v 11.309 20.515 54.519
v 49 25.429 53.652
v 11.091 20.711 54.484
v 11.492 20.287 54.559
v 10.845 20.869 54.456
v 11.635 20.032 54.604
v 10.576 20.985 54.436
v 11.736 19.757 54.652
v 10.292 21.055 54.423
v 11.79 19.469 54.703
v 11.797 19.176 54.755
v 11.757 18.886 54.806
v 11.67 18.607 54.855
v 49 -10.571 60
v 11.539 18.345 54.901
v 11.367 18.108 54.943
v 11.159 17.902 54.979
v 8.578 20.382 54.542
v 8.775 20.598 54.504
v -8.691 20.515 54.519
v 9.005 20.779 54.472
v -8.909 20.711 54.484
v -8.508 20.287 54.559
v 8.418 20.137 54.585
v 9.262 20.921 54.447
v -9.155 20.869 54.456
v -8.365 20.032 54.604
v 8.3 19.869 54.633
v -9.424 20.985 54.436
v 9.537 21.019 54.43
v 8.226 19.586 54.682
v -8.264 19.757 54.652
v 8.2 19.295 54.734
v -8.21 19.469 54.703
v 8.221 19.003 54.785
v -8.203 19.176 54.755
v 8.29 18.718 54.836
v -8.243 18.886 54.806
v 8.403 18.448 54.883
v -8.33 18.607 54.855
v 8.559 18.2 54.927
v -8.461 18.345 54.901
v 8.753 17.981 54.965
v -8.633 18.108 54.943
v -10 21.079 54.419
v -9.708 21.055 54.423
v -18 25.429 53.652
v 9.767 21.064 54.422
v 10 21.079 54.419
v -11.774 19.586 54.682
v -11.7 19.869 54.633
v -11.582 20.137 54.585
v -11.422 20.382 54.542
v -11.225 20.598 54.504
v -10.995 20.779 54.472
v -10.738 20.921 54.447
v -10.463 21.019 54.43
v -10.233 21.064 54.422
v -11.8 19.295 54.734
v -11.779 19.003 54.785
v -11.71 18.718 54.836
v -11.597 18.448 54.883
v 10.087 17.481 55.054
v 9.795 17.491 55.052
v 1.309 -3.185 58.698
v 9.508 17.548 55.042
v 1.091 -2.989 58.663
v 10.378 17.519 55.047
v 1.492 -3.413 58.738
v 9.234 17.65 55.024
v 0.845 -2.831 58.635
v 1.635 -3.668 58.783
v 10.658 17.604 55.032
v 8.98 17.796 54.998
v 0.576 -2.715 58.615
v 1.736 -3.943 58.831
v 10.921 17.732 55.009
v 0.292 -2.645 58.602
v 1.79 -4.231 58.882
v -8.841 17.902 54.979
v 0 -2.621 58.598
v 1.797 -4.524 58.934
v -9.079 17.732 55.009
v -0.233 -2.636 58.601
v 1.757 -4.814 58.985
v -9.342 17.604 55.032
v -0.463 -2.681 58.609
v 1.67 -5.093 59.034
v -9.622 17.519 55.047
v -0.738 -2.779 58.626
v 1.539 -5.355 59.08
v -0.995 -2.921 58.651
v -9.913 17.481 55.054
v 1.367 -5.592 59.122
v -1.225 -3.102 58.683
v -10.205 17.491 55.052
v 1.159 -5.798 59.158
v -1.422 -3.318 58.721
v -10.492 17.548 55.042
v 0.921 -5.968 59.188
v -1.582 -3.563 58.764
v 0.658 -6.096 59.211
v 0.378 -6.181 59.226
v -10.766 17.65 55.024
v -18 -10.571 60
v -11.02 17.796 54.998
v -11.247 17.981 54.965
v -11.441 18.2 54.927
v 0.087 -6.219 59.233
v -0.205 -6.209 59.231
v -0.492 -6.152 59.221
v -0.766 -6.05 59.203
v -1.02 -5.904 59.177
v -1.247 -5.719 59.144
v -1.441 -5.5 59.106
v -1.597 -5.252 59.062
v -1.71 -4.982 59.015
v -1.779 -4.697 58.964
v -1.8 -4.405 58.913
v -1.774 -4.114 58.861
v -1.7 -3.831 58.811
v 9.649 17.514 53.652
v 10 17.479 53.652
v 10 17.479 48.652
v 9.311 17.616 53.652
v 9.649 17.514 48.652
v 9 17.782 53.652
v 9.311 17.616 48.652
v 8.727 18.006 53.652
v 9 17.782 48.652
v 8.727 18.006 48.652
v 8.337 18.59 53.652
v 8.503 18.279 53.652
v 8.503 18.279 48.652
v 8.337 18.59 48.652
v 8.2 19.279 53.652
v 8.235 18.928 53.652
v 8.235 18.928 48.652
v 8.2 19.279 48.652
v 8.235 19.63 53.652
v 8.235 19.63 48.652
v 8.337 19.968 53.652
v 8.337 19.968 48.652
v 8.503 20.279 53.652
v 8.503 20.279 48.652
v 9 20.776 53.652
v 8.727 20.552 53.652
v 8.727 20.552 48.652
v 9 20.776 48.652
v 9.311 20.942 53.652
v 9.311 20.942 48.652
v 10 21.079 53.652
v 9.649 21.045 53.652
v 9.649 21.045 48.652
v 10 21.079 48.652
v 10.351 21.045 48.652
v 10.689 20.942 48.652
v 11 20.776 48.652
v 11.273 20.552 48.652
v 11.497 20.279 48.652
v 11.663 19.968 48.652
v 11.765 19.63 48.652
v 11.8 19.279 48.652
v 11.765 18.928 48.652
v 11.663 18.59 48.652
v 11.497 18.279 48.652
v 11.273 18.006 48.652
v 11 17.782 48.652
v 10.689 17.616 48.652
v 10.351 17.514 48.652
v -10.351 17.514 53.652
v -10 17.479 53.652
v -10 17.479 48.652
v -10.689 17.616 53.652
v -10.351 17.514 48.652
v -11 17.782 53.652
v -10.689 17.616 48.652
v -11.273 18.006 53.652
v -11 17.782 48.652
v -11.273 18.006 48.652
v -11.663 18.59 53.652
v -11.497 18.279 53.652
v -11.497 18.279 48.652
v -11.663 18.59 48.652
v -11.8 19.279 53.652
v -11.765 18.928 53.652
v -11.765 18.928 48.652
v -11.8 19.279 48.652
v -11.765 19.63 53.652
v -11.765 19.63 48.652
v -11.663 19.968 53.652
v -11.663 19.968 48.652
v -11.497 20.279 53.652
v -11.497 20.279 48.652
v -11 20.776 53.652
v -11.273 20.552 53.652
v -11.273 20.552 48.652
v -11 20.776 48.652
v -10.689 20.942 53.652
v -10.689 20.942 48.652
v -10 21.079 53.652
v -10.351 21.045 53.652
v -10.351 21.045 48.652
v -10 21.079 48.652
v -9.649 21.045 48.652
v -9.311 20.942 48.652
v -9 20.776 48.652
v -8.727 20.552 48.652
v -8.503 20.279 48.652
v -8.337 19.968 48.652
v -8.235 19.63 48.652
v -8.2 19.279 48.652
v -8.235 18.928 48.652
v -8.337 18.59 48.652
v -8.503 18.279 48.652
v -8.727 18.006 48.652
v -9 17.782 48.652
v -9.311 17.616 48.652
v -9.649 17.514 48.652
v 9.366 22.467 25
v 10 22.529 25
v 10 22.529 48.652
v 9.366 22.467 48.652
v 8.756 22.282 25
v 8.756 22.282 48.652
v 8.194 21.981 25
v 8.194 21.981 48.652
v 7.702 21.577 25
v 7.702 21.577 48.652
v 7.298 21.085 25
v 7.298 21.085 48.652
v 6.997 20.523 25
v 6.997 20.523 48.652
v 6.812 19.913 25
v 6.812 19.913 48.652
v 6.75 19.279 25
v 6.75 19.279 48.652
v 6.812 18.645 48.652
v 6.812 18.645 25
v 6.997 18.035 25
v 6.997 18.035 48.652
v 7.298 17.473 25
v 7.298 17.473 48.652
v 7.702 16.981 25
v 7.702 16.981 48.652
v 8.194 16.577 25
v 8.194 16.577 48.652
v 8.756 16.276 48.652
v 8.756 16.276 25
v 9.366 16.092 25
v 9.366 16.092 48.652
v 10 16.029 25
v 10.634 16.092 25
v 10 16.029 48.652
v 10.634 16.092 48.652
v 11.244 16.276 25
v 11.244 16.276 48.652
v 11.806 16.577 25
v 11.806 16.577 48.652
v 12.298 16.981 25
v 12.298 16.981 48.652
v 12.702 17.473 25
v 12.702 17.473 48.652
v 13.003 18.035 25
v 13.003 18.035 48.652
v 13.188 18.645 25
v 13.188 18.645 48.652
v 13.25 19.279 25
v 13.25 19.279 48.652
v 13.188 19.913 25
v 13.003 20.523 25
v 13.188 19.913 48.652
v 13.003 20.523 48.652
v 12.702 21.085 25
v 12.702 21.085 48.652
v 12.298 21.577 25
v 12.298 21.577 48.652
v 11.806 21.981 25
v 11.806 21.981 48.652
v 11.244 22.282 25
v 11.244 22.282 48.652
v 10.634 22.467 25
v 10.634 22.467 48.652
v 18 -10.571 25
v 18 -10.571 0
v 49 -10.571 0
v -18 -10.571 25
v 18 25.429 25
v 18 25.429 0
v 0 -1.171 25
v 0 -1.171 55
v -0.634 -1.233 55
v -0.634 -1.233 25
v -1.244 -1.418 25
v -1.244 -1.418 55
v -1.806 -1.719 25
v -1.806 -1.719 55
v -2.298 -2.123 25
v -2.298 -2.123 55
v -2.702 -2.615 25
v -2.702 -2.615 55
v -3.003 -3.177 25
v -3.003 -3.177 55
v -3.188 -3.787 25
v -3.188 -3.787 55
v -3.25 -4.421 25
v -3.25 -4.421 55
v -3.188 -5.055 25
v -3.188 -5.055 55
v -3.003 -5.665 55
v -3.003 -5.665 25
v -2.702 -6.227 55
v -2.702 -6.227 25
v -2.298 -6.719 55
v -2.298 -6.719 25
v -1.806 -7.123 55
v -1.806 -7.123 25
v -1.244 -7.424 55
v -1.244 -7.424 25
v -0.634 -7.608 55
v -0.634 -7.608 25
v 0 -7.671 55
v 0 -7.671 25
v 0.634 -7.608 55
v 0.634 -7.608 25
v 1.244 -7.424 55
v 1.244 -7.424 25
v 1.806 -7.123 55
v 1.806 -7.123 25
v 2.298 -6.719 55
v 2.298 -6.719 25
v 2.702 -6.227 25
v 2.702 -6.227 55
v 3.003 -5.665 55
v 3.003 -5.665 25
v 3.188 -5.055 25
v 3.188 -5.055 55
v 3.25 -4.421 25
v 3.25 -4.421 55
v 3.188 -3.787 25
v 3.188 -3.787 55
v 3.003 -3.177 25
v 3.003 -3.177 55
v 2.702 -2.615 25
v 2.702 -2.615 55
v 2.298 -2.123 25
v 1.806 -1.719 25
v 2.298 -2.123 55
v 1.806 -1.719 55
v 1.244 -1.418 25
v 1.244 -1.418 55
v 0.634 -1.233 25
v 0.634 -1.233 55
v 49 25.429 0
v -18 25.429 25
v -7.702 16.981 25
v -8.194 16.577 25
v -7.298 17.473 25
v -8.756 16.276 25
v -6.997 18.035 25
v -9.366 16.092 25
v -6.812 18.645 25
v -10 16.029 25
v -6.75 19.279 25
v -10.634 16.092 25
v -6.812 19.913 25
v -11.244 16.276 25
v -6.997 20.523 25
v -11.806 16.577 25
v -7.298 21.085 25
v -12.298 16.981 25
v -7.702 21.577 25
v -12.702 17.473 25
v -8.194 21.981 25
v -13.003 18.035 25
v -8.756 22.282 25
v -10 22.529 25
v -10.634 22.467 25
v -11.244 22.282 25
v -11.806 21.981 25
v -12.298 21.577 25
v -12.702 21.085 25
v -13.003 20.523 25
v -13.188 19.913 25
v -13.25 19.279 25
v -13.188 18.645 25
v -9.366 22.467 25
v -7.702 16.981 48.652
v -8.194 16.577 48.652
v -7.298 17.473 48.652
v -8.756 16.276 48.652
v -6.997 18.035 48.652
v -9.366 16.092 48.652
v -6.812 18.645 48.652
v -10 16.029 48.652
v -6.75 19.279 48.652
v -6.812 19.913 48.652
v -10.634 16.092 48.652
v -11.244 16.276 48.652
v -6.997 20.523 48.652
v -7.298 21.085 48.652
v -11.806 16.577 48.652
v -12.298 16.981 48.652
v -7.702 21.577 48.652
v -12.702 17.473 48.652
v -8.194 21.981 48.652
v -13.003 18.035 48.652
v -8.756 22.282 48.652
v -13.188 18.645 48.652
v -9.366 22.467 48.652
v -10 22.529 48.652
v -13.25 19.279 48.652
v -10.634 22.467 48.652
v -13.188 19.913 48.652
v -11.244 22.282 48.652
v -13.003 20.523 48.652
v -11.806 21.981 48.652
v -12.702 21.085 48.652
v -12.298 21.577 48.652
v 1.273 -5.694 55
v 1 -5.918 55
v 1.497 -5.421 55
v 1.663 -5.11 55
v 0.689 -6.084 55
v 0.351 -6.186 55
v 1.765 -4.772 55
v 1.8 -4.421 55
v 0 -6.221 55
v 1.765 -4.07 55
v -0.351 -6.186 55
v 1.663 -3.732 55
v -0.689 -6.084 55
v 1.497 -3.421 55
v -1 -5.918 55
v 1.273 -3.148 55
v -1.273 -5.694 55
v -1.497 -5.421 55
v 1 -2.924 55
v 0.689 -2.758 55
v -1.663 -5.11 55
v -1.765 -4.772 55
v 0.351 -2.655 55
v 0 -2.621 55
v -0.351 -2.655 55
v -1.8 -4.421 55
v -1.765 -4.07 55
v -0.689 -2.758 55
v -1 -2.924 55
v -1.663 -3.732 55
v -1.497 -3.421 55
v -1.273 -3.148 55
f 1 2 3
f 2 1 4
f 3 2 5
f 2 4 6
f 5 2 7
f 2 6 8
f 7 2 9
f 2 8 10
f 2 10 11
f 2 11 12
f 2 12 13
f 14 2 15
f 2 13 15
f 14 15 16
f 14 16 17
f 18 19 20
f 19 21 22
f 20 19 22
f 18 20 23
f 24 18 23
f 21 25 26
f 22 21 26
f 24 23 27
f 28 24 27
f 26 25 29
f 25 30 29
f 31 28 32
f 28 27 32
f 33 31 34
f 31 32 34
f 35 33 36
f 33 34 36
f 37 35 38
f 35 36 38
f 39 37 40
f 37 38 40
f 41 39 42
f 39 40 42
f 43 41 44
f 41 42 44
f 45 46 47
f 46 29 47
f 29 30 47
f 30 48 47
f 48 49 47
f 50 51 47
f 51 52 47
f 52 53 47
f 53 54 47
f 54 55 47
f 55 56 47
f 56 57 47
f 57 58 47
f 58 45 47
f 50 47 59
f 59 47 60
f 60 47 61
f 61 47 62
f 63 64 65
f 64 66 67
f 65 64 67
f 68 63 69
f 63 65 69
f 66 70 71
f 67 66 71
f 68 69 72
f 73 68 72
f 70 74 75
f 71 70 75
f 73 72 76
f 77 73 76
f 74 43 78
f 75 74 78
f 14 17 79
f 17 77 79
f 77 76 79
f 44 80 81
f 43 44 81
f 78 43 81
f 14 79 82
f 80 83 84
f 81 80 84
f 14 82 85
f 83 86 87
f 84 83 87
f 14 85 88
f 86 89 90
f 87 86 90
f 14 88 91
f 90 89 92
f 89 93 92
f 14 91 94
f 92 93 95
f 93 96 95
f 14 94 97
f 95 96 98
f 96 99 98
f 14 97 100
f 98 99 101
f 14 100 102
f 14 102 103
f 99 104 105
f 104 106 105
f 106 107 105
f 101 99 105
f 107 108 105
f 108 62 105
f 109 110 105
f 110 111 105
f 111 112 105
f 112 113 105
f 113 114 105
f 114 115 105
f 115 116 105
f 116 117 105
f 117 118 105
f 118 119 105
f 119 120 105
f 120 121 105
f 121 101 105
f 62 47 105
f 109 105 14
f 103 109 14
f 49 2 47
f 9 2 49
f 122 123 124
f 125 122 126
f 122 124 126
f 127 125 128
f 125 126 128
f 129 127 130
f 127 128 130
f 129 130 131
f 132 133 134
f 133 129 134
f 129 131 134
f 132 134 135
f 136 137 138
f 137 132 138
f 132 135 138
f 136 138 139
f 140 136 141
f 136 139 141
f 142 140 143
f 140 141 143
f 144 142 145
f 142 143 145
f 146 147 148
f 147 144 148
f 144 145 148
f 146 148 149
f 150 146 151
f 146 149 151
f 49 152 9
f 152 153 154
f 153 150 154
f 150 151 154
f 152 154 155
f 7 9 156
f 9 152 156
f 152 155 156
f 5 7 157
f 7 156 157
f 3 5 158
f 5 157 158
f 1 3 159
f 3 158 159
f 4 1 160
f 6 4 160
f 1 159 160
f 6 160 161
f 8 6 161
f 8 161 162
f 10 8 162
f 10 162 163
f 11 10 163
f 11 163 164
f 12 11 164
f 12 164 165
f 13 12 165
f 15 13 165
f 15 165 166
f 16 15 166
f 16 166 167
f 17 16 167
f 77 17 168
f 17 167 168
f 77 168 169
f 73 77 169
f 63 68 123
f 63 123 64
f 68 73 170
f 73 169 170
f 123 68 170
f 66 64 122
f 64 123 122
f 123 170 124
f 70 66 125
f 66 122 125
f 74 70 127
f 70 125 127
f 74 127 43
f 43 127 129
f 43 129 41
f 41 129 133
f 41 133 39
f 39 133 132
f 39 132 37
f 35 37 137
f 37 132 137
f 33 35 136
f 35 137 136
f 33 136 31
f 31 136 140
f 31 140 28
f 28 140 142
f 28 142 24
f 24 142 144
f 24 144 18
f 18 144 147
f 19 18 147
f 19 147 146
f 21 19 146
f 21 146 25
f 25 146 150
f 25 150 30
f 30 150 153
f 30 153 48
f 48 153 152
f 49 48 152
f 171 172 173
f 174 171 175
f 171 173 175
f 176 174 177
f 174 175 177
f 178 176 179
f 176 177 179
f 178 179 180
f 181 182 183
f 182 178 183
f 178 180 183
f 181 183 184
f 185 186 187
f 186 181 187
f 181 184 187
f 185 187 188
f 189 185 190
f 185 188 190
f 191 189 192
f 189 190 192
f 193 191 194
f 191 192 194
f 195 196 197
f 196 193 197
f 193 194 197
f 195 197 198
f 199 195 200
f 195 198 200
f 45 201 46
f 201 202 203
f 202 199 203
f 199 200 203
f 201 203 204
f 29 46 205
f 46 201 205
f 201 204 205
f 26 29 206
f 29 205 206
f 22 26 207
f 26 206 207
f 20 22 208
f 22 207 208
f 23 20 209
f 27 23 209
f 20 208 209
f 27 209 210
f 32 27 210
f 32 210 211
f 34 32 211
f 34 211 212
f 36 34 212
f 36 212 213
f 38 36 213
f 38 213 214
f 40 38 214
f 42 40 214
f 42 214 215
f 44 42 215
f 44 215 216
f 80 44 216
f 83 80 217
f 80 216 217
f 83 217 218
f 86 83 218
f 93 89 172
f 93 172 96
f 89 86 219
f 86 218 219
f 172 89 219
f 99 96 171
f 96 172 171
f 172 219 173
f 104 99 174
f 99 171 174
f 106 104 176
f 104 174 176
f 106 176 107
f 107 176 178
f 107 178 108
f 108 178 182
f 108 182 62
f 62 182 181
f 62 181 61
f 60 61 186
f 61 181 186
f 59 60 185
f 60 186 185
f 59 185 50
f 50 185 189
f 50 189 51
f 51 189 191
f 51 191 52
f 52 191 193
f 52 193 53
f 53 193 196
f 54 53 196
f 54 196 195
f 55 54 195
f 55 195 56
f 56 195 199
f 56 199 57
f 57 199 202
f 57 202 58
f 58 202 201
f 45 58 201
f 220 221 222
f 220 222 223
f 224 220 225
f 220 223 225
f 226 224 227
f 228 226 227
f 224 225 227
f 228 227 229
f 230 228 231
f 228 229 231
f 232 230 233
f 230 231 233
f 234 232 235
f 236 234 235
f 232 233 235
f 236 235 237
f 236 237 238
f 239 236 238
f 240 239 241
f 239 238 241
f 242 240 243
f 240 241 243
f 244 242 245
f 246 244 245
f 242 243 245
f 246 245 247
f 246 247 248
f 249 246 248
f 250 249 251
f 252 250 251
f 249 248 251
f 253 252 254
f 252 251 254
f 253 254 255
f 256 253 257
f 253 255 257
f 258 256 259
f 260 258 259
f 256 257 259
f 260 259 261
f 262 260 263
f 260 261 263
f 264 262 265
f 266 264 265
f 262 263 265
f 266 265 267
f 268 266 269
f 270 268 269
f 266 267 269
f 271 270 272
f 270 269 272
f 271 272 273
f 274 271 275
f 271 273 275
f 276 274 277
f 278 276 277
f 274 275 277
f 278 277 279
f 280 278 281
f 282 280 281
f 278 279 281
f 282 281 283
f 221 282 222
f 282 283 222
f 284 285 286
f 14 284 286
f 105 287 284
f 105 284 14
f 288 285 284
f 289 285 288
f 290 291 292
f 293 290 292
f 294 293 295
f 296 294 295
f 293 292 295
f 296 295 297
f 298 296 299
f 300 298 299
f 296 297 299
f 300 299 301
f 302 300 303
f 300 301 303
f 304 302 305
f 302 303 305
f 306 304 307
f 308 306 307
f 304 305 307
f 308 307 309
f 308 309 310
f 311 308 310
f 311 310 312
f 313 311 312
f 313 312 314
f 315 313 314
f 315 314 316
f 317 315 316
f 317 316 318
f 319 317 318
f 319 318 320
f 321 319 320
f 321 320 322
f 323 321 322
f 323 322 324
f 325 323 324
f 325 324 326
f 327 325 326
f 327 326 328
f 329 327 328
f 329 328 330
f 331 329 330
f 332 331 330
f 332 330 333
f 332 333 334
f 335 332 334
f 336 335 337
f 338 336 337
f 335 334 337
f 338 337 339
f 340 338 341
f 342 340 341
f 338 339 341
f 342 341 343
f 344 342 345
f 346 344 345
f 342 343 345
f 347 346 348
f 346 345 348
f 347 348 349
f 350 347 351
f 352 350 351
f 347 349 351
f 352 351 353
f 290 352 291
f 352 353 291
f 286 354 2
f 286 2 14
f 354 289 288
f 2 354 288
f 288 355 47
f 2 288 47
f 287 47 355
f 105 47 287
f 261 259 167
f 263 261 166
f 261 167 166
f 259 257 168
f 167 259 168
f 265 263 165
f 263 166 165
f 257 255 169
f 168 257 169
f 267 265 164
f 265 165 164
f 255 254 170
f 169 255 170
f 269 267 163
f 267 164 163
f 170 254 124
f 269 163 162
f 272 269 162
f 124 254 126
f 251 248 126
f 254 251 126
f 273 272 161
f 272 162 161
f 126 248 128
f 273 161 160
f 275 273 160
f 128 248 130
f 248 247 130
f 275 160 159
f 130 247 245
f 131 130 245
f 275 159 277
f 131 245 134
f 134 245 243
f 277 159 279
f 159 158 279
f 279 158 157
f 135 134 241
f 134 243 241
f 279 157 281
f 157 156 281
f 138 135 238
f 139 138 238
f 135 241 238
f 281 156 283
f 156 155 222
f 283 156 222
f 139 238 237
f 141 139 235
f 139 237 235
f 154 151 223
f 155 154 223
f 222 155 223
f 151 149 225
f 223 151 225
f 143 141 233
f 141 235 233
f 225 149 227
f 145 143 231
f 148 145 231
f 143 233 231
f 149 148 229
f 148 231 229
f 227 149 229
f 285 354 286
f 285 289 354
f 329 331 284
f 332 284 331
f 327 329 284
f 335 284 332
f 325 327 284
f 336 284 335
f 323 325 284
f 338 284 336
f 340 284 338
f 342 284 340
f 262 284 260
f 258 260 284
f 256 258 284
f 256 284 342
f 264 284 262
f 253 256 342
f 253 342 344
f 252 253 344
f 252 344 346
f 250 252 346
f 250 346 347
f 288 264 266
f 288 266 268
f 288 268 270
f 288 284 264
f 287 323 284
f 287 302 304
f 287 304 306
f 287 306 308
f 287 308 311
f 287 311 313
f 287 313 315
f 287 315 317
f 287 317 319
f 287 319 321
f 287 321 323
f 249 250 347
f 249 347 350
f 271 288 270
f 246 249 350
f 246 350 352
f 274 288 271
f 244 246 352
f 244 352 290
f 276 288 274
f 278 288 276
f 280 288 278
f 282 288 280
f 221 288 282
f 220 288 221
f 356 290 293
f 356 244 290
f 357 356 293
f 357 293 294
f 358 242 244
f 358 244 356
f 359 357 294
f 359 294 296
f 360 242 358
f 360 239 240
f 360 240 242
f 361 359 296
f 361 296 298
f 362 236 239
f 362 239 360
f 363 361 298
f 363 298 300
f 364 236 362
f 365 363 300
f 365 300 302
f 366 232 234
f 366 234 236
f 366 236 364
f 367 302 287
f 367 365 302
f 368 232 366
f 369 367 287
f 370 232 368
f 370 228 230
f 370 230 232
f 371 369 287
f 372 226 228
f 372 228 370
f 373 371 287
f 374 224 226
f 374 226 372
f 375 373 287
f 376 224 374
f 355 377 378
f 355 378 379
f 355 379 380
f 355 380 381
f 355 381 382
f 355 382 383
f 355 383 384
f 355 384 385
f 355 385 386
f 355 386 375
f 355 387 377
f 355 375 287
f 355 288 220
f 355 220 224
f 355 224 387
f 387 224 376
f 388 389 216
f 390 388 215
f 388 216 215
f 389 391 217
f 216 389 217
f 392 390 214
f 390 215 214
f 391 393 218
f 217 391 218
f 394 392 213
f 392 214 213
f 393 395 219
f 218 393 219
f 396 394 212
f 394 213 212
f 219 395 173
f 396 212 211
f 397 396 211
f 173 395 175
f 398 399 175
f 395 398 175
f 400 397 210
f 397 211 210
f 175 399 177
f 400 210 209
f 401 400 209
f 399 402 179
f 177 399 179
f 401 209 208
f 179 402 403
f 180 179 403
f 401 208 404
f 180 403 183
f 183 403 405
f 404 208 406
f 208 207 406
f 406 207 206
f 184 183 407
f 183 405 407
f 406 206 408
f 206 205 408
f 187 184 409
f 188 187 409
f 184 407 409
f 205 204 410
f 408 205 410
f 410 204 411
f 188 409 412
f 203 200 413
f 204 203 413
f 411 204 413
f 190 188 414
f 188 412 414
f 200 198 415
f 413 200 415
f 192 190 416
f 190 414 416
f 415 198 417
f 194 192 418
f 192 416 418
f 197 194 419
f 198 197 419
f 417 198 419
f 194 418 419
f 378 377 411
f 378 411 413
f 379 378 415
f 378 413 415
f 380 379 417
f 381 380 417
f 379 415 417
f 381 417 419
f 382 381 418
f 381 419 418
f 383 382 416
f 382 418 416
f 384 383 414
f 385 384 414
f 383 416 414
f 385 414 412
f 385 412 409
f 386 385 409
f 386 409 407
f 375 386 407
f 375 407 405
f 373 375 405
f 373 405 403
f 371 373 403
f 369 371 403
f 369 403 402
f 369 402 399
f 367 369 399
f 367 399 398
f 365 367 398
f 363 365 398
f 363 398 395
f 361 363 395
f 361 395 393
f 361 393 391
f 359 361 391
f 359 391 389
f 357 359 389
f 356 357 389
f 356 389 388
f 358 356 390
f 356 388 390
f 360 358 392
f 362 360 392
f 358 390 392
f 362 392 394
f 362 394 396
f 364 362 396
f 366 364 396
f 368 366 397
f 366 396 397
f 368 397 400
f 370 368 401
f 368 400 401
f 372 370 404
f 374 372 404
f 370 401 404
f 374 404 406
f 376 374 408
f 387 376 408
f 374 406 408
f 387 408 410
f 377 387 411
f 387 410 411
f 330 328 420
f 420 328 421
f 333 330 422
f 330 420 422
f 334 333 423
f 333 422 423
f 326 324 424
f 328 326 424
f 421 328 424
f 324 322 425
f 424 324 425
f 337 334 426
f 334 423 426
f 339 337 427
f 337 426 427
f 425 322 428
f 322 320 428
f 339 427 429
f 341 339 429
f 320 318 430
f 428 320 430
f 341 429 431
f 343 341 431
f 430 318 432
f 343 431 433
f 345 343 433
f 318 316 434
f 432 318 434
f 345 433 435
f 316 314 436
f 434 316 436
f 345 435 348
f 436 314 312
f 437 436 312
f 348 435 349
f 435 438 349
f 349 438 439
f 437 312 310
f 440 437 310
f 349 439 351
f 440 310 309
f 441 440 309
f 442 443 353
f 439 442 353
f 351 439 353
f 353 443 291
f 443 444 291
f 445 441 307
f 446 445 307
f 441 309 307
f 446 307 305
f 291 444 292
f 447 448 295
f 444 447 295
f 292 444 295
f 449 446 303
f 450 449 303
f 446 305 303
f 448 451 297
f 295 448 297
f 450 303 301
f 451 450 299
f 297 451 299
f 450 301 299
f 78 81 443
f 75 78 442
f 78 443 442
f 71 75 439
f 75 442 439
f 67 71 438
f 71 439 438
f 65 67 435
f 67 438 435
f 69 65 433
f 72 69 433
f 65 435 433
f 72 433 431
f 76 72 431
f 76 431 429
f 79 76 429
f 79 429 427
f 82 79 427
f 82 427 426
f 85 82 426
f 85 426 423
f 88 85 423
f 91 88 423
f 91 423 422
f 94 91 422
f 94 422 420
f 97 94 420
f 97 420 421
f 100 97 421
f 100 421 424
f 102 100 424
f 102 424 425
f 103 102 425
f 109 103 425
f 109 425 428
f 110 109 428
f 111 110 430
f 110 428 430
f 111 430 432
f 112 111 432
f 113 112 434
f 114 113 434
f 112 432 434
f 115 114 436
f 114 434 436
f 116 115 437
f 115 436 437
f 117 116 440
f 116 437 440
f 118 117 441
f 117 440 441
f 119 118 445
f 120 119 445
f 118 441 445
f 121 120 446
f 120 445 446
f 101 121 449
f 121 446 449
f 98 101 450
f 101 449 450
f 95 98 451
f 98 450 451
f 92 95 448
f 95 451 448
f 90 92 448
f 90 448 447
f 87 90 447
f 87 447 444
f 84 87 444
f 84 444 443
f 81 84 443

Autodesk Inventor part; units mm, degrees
ref_plane "YZ Plane" through (0, 0, 0) normal (1, 0, 0) x (0, 1, 0)
ref_plane "XZ Plane" through (0, 0, 0) normal (0, 1, 0) x (-1, 0, 0)
ref_plane "XY Plane" through (0, 0, 0) normal (0, 0, 1) x (1, 0, 0)
ref_plane "Work Plane1" through (4.4043, -35.2586, 0) normal (0, 0, 1) x (1, 0, 0)
ref_plane "Work Plane2" through (-18, 18, 0) normal (-1, 0, 0) x (0, -1, 0)
sketch "Sketch2" plane through (-18, 18, 0) normal (-1, 0, 0) x (0, -1, 0)
  line L0 (-7.4291, 0) -> (28.5709, 0)
  line L1 (28.5709, 0) -> (28.5709, 60)
  line L2 (-7.4291, 0) -> (-7.4291, 53.6522)
  line L3 (-7.4291, 53.6522) -> (28.5709, 60)
  point P0 (14.2854, 0)
  dimension "d7" = 60
  dimension "d56" = 36
  dimension "d59" = 80
extrude "Extrusion1" add sketch "Sketch2" against normal blind 67
ref_plane "Work Plane3" through (-18, 25.4291, 53.6522) normal (0, 0, -1) x (1, 0, 0)
sketch "Sketch3" plane through (-18, 25.4291, 53.6522) normal (0, 0, -1) x (1, 0, 0)
  line L0 (18, 43.2) -> (18, -7.2) projected
  circle A0 centre (18, 29.85) radius 1.8
  circle A1 centre (28, 6.15) radius 1.8
  circle A2 centre (8, 6.15) radius 1.8
  line L1 (18, 29.85) -> (33.5, 36)
  line L2 (0, 36) -> (67, 36) projected
  line L3 (28, 6.15) -> (12.5, 0)
  line L4 (0, 0) -> (67, 0) projected
  point P0 (18, 25.4291)
  point P1 (18, 6.0253)
  point P2 (29.4211, 27.8342)
  point P3 (6.5789, 27.8342)
  dimension "d33" = 3.6
  dimension "d34" = 3.6
  dimension "d57" = 23.7
  dimension "d58" = 10
hole "Hole4" at (10, 19.2791, 53.6522) at (0, -4.4209, 53.6522) at (-10, 19.2791, 53.6522) direction (0, 0, 1) diameter 3.6 end through all
hole "Hole5" at (10, 19.2791, 53.6522) at (-10, 19.2791, 53.6522) at (0, -4.4209, 53.6522) direction (0, 0, -1) diameter 3.6 end through all
sketch "Sketch5" plane through (-18, -10.5709, 0) normal (0, 0, -1) x (-1, 0, 0)
  circle A0 centre (-8, 29.85) radius 1.8 projected
  circle A1 centre (-18, 6.15) radius 1.8 projected
  circle A2 centre (-28, 29.85) radius 1.8 projected
  point P0 (-18, 10.5709)
hole "Hole6" at (-10, 19.2791, 0) at (10, 19.2791, 0) direction (0, 0, 1) diameter 6.5 depth 48.652
hole "Hole7" at (0, -4.4209, 0) direction (0, 0, 1) diameter 6.5 depth 55
sketch "Sketch6" plane through (-18, -10.5709, 0) normal (0, 0, -1) x (-1, 0, 0)
  line L0 (0, 0) -> (0, 36) projected
  line L1 (0, 0) -> (-36, 0)
  line L2 (-36, 0) -> (-36, 36)
  line L3 (-36, 36) -> (0, 36)
  line L4 (0, 36) -> (0, 0)
  point P0 (-18, 10.5709)
  dimension "d67" = 36
  dimension "d68" = 36
extrude "Extrusion2" cut sketch "Sketch6" against normal blind 25
properties part number "Camera_mount_angled"
